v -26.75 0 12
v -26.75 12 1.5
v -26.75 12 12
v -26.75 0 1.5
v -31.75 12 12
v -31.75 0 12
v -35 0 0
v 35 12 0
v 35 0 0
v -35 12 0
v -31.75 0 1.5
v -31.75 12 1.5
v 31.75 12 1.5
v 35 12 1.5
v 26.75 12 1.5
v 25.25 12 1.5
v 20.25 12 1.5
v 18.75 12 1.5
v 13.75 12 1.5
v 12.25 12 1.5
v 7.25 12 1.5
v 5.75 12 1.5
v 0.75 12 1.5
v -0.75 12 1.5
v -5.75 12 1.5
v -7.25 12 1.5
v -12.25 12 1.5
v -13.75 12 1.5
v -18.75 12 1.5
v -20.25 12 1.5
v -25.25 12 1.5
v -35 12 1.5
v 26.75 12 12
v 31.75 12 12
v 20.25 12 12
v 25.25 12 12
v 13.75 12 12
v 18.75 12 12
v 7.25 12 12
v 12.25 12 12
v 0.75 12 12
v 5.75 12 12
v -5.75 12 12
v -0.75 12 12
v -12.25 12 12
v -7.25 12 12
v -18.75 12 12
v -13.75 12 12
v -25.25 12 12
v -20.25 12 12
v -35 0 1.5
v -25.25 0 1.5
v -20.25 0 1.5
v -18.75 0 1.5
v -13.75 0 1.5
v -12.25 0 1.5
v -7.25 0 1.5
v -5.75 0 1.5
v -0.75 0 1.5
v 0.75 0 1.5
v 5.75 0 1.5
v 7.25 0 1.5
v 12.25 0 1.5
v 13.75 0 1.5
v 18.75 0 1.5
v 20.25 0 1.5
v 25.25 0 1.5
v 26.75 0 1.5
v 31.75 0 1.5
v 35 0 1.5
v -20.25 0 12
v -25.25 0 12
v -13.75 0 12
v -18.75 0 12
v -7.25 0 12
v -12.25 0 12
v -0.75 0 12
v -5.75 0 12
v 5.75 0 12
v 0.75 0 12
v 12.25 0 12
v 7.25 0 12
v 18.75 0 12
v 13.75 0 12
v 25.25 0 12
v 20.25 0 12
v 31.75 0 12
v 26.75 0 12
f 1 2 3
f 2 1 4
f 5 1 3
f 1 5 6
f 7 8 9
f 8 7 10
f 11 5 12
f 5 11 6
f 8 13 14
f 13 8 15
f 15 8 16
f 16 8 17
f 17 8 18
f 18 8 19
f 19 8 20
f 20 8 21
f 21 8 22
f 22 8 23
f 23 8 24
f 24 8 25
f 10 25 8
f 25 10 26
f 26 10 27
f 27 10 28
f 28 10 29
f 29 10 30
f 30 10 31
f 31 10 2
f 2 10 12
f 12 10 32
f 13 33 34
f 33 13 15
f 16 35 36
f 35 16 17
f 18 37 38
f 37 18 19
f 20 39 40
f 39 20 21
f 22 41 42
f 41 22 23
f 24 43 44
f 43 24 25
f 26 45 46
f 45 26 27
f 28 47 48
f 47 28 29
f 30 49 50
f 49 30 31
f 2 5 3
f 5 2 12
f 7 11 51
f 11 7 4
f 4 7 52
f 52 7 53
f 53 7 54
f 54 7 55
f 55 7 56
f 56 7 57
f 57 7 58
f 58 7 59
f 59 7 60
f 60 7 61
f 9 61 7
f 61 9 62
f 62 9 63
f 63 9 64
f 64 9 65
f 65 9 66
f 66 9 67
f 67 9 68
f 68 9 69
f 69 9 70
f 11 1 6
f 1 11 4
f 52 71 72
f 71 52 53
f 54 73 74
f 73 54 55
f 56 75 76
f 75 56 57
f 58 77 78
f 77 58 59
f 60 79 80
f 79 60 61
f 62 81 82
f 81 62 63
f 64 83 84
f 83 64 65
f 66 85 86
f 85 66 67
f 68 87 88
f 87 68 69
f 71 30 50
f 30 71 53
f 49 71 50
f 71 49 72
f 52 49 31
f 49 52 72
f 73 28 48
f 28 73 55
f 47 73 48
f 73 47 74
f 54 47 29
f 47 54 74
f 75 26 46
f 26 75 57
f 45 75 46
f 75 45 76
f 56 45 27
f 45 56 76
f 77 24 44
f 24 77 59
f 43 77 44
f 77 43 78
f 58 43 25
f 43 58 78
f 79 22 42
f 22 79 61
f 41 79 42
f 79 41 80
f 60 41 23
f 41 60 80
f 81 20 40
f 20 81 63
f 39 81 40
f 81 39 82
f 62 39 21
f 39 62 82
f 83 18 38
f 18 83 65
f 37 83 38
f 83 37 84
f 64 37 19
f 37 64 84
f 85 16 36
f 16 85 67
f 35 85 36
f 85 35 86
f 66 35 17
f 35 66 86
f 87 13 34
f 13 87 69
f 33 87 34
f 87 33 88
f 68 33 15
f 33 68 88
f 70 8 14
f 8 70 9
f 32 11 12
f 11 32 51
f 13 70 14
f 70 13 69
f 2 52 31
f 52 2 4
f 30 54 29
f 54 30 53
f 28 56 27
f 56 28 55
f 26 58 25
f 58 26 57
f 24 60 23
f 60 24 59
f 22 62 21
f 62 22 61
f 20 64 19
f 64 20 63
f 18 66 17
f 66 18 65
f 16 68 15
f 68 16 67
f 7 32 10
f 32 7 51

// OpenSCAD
// 10-well agarose gel comb, printed lying flat
// Units: mm. Print orientation: plate on bed (z = 0), teeth up (+Z).

// ---------------- Parameters ----------------
plate_t      = 1.5;    // plate thickness (Z)
spine_len    = 70;     // spine length (X)
spine_w      = 12;     // spine width (Y)

tooth_count  = 10;     // number of wells
tooth_w      = 5.0;    // tooth width (X)
tooth_l      = 12;     // tooth length (Y)
tooth_h      = 12;     // tooth height from plate (Z)

gap          = 1.5;    // gap between neighbouring teeth (X)
eps          = 0.5;    // overcut for clean differences

$fn = 64;

// ---------------- Derived ----------------
pitch   = tooth_w + gap;              // centre-to-centre spacing
x0      = -(tooth_count - 1) * pitch / 2; // first tooth centre (row centred)

// ---------------- Model ----------------
union() {
    // Spine (back bar)
    translate([-spine_len / 2, 0, 0])
        cube([spine_len, spine_w, plate_t]);

    // Teeth
    for (i = [0 : tooth_count - 1])
        translate([x0 + i * pitch - tooth_w / 2,
                   spine_w - tooth_l,
                   0])
            cube([tooth_w, tooth_l, tooth_h]);
}
